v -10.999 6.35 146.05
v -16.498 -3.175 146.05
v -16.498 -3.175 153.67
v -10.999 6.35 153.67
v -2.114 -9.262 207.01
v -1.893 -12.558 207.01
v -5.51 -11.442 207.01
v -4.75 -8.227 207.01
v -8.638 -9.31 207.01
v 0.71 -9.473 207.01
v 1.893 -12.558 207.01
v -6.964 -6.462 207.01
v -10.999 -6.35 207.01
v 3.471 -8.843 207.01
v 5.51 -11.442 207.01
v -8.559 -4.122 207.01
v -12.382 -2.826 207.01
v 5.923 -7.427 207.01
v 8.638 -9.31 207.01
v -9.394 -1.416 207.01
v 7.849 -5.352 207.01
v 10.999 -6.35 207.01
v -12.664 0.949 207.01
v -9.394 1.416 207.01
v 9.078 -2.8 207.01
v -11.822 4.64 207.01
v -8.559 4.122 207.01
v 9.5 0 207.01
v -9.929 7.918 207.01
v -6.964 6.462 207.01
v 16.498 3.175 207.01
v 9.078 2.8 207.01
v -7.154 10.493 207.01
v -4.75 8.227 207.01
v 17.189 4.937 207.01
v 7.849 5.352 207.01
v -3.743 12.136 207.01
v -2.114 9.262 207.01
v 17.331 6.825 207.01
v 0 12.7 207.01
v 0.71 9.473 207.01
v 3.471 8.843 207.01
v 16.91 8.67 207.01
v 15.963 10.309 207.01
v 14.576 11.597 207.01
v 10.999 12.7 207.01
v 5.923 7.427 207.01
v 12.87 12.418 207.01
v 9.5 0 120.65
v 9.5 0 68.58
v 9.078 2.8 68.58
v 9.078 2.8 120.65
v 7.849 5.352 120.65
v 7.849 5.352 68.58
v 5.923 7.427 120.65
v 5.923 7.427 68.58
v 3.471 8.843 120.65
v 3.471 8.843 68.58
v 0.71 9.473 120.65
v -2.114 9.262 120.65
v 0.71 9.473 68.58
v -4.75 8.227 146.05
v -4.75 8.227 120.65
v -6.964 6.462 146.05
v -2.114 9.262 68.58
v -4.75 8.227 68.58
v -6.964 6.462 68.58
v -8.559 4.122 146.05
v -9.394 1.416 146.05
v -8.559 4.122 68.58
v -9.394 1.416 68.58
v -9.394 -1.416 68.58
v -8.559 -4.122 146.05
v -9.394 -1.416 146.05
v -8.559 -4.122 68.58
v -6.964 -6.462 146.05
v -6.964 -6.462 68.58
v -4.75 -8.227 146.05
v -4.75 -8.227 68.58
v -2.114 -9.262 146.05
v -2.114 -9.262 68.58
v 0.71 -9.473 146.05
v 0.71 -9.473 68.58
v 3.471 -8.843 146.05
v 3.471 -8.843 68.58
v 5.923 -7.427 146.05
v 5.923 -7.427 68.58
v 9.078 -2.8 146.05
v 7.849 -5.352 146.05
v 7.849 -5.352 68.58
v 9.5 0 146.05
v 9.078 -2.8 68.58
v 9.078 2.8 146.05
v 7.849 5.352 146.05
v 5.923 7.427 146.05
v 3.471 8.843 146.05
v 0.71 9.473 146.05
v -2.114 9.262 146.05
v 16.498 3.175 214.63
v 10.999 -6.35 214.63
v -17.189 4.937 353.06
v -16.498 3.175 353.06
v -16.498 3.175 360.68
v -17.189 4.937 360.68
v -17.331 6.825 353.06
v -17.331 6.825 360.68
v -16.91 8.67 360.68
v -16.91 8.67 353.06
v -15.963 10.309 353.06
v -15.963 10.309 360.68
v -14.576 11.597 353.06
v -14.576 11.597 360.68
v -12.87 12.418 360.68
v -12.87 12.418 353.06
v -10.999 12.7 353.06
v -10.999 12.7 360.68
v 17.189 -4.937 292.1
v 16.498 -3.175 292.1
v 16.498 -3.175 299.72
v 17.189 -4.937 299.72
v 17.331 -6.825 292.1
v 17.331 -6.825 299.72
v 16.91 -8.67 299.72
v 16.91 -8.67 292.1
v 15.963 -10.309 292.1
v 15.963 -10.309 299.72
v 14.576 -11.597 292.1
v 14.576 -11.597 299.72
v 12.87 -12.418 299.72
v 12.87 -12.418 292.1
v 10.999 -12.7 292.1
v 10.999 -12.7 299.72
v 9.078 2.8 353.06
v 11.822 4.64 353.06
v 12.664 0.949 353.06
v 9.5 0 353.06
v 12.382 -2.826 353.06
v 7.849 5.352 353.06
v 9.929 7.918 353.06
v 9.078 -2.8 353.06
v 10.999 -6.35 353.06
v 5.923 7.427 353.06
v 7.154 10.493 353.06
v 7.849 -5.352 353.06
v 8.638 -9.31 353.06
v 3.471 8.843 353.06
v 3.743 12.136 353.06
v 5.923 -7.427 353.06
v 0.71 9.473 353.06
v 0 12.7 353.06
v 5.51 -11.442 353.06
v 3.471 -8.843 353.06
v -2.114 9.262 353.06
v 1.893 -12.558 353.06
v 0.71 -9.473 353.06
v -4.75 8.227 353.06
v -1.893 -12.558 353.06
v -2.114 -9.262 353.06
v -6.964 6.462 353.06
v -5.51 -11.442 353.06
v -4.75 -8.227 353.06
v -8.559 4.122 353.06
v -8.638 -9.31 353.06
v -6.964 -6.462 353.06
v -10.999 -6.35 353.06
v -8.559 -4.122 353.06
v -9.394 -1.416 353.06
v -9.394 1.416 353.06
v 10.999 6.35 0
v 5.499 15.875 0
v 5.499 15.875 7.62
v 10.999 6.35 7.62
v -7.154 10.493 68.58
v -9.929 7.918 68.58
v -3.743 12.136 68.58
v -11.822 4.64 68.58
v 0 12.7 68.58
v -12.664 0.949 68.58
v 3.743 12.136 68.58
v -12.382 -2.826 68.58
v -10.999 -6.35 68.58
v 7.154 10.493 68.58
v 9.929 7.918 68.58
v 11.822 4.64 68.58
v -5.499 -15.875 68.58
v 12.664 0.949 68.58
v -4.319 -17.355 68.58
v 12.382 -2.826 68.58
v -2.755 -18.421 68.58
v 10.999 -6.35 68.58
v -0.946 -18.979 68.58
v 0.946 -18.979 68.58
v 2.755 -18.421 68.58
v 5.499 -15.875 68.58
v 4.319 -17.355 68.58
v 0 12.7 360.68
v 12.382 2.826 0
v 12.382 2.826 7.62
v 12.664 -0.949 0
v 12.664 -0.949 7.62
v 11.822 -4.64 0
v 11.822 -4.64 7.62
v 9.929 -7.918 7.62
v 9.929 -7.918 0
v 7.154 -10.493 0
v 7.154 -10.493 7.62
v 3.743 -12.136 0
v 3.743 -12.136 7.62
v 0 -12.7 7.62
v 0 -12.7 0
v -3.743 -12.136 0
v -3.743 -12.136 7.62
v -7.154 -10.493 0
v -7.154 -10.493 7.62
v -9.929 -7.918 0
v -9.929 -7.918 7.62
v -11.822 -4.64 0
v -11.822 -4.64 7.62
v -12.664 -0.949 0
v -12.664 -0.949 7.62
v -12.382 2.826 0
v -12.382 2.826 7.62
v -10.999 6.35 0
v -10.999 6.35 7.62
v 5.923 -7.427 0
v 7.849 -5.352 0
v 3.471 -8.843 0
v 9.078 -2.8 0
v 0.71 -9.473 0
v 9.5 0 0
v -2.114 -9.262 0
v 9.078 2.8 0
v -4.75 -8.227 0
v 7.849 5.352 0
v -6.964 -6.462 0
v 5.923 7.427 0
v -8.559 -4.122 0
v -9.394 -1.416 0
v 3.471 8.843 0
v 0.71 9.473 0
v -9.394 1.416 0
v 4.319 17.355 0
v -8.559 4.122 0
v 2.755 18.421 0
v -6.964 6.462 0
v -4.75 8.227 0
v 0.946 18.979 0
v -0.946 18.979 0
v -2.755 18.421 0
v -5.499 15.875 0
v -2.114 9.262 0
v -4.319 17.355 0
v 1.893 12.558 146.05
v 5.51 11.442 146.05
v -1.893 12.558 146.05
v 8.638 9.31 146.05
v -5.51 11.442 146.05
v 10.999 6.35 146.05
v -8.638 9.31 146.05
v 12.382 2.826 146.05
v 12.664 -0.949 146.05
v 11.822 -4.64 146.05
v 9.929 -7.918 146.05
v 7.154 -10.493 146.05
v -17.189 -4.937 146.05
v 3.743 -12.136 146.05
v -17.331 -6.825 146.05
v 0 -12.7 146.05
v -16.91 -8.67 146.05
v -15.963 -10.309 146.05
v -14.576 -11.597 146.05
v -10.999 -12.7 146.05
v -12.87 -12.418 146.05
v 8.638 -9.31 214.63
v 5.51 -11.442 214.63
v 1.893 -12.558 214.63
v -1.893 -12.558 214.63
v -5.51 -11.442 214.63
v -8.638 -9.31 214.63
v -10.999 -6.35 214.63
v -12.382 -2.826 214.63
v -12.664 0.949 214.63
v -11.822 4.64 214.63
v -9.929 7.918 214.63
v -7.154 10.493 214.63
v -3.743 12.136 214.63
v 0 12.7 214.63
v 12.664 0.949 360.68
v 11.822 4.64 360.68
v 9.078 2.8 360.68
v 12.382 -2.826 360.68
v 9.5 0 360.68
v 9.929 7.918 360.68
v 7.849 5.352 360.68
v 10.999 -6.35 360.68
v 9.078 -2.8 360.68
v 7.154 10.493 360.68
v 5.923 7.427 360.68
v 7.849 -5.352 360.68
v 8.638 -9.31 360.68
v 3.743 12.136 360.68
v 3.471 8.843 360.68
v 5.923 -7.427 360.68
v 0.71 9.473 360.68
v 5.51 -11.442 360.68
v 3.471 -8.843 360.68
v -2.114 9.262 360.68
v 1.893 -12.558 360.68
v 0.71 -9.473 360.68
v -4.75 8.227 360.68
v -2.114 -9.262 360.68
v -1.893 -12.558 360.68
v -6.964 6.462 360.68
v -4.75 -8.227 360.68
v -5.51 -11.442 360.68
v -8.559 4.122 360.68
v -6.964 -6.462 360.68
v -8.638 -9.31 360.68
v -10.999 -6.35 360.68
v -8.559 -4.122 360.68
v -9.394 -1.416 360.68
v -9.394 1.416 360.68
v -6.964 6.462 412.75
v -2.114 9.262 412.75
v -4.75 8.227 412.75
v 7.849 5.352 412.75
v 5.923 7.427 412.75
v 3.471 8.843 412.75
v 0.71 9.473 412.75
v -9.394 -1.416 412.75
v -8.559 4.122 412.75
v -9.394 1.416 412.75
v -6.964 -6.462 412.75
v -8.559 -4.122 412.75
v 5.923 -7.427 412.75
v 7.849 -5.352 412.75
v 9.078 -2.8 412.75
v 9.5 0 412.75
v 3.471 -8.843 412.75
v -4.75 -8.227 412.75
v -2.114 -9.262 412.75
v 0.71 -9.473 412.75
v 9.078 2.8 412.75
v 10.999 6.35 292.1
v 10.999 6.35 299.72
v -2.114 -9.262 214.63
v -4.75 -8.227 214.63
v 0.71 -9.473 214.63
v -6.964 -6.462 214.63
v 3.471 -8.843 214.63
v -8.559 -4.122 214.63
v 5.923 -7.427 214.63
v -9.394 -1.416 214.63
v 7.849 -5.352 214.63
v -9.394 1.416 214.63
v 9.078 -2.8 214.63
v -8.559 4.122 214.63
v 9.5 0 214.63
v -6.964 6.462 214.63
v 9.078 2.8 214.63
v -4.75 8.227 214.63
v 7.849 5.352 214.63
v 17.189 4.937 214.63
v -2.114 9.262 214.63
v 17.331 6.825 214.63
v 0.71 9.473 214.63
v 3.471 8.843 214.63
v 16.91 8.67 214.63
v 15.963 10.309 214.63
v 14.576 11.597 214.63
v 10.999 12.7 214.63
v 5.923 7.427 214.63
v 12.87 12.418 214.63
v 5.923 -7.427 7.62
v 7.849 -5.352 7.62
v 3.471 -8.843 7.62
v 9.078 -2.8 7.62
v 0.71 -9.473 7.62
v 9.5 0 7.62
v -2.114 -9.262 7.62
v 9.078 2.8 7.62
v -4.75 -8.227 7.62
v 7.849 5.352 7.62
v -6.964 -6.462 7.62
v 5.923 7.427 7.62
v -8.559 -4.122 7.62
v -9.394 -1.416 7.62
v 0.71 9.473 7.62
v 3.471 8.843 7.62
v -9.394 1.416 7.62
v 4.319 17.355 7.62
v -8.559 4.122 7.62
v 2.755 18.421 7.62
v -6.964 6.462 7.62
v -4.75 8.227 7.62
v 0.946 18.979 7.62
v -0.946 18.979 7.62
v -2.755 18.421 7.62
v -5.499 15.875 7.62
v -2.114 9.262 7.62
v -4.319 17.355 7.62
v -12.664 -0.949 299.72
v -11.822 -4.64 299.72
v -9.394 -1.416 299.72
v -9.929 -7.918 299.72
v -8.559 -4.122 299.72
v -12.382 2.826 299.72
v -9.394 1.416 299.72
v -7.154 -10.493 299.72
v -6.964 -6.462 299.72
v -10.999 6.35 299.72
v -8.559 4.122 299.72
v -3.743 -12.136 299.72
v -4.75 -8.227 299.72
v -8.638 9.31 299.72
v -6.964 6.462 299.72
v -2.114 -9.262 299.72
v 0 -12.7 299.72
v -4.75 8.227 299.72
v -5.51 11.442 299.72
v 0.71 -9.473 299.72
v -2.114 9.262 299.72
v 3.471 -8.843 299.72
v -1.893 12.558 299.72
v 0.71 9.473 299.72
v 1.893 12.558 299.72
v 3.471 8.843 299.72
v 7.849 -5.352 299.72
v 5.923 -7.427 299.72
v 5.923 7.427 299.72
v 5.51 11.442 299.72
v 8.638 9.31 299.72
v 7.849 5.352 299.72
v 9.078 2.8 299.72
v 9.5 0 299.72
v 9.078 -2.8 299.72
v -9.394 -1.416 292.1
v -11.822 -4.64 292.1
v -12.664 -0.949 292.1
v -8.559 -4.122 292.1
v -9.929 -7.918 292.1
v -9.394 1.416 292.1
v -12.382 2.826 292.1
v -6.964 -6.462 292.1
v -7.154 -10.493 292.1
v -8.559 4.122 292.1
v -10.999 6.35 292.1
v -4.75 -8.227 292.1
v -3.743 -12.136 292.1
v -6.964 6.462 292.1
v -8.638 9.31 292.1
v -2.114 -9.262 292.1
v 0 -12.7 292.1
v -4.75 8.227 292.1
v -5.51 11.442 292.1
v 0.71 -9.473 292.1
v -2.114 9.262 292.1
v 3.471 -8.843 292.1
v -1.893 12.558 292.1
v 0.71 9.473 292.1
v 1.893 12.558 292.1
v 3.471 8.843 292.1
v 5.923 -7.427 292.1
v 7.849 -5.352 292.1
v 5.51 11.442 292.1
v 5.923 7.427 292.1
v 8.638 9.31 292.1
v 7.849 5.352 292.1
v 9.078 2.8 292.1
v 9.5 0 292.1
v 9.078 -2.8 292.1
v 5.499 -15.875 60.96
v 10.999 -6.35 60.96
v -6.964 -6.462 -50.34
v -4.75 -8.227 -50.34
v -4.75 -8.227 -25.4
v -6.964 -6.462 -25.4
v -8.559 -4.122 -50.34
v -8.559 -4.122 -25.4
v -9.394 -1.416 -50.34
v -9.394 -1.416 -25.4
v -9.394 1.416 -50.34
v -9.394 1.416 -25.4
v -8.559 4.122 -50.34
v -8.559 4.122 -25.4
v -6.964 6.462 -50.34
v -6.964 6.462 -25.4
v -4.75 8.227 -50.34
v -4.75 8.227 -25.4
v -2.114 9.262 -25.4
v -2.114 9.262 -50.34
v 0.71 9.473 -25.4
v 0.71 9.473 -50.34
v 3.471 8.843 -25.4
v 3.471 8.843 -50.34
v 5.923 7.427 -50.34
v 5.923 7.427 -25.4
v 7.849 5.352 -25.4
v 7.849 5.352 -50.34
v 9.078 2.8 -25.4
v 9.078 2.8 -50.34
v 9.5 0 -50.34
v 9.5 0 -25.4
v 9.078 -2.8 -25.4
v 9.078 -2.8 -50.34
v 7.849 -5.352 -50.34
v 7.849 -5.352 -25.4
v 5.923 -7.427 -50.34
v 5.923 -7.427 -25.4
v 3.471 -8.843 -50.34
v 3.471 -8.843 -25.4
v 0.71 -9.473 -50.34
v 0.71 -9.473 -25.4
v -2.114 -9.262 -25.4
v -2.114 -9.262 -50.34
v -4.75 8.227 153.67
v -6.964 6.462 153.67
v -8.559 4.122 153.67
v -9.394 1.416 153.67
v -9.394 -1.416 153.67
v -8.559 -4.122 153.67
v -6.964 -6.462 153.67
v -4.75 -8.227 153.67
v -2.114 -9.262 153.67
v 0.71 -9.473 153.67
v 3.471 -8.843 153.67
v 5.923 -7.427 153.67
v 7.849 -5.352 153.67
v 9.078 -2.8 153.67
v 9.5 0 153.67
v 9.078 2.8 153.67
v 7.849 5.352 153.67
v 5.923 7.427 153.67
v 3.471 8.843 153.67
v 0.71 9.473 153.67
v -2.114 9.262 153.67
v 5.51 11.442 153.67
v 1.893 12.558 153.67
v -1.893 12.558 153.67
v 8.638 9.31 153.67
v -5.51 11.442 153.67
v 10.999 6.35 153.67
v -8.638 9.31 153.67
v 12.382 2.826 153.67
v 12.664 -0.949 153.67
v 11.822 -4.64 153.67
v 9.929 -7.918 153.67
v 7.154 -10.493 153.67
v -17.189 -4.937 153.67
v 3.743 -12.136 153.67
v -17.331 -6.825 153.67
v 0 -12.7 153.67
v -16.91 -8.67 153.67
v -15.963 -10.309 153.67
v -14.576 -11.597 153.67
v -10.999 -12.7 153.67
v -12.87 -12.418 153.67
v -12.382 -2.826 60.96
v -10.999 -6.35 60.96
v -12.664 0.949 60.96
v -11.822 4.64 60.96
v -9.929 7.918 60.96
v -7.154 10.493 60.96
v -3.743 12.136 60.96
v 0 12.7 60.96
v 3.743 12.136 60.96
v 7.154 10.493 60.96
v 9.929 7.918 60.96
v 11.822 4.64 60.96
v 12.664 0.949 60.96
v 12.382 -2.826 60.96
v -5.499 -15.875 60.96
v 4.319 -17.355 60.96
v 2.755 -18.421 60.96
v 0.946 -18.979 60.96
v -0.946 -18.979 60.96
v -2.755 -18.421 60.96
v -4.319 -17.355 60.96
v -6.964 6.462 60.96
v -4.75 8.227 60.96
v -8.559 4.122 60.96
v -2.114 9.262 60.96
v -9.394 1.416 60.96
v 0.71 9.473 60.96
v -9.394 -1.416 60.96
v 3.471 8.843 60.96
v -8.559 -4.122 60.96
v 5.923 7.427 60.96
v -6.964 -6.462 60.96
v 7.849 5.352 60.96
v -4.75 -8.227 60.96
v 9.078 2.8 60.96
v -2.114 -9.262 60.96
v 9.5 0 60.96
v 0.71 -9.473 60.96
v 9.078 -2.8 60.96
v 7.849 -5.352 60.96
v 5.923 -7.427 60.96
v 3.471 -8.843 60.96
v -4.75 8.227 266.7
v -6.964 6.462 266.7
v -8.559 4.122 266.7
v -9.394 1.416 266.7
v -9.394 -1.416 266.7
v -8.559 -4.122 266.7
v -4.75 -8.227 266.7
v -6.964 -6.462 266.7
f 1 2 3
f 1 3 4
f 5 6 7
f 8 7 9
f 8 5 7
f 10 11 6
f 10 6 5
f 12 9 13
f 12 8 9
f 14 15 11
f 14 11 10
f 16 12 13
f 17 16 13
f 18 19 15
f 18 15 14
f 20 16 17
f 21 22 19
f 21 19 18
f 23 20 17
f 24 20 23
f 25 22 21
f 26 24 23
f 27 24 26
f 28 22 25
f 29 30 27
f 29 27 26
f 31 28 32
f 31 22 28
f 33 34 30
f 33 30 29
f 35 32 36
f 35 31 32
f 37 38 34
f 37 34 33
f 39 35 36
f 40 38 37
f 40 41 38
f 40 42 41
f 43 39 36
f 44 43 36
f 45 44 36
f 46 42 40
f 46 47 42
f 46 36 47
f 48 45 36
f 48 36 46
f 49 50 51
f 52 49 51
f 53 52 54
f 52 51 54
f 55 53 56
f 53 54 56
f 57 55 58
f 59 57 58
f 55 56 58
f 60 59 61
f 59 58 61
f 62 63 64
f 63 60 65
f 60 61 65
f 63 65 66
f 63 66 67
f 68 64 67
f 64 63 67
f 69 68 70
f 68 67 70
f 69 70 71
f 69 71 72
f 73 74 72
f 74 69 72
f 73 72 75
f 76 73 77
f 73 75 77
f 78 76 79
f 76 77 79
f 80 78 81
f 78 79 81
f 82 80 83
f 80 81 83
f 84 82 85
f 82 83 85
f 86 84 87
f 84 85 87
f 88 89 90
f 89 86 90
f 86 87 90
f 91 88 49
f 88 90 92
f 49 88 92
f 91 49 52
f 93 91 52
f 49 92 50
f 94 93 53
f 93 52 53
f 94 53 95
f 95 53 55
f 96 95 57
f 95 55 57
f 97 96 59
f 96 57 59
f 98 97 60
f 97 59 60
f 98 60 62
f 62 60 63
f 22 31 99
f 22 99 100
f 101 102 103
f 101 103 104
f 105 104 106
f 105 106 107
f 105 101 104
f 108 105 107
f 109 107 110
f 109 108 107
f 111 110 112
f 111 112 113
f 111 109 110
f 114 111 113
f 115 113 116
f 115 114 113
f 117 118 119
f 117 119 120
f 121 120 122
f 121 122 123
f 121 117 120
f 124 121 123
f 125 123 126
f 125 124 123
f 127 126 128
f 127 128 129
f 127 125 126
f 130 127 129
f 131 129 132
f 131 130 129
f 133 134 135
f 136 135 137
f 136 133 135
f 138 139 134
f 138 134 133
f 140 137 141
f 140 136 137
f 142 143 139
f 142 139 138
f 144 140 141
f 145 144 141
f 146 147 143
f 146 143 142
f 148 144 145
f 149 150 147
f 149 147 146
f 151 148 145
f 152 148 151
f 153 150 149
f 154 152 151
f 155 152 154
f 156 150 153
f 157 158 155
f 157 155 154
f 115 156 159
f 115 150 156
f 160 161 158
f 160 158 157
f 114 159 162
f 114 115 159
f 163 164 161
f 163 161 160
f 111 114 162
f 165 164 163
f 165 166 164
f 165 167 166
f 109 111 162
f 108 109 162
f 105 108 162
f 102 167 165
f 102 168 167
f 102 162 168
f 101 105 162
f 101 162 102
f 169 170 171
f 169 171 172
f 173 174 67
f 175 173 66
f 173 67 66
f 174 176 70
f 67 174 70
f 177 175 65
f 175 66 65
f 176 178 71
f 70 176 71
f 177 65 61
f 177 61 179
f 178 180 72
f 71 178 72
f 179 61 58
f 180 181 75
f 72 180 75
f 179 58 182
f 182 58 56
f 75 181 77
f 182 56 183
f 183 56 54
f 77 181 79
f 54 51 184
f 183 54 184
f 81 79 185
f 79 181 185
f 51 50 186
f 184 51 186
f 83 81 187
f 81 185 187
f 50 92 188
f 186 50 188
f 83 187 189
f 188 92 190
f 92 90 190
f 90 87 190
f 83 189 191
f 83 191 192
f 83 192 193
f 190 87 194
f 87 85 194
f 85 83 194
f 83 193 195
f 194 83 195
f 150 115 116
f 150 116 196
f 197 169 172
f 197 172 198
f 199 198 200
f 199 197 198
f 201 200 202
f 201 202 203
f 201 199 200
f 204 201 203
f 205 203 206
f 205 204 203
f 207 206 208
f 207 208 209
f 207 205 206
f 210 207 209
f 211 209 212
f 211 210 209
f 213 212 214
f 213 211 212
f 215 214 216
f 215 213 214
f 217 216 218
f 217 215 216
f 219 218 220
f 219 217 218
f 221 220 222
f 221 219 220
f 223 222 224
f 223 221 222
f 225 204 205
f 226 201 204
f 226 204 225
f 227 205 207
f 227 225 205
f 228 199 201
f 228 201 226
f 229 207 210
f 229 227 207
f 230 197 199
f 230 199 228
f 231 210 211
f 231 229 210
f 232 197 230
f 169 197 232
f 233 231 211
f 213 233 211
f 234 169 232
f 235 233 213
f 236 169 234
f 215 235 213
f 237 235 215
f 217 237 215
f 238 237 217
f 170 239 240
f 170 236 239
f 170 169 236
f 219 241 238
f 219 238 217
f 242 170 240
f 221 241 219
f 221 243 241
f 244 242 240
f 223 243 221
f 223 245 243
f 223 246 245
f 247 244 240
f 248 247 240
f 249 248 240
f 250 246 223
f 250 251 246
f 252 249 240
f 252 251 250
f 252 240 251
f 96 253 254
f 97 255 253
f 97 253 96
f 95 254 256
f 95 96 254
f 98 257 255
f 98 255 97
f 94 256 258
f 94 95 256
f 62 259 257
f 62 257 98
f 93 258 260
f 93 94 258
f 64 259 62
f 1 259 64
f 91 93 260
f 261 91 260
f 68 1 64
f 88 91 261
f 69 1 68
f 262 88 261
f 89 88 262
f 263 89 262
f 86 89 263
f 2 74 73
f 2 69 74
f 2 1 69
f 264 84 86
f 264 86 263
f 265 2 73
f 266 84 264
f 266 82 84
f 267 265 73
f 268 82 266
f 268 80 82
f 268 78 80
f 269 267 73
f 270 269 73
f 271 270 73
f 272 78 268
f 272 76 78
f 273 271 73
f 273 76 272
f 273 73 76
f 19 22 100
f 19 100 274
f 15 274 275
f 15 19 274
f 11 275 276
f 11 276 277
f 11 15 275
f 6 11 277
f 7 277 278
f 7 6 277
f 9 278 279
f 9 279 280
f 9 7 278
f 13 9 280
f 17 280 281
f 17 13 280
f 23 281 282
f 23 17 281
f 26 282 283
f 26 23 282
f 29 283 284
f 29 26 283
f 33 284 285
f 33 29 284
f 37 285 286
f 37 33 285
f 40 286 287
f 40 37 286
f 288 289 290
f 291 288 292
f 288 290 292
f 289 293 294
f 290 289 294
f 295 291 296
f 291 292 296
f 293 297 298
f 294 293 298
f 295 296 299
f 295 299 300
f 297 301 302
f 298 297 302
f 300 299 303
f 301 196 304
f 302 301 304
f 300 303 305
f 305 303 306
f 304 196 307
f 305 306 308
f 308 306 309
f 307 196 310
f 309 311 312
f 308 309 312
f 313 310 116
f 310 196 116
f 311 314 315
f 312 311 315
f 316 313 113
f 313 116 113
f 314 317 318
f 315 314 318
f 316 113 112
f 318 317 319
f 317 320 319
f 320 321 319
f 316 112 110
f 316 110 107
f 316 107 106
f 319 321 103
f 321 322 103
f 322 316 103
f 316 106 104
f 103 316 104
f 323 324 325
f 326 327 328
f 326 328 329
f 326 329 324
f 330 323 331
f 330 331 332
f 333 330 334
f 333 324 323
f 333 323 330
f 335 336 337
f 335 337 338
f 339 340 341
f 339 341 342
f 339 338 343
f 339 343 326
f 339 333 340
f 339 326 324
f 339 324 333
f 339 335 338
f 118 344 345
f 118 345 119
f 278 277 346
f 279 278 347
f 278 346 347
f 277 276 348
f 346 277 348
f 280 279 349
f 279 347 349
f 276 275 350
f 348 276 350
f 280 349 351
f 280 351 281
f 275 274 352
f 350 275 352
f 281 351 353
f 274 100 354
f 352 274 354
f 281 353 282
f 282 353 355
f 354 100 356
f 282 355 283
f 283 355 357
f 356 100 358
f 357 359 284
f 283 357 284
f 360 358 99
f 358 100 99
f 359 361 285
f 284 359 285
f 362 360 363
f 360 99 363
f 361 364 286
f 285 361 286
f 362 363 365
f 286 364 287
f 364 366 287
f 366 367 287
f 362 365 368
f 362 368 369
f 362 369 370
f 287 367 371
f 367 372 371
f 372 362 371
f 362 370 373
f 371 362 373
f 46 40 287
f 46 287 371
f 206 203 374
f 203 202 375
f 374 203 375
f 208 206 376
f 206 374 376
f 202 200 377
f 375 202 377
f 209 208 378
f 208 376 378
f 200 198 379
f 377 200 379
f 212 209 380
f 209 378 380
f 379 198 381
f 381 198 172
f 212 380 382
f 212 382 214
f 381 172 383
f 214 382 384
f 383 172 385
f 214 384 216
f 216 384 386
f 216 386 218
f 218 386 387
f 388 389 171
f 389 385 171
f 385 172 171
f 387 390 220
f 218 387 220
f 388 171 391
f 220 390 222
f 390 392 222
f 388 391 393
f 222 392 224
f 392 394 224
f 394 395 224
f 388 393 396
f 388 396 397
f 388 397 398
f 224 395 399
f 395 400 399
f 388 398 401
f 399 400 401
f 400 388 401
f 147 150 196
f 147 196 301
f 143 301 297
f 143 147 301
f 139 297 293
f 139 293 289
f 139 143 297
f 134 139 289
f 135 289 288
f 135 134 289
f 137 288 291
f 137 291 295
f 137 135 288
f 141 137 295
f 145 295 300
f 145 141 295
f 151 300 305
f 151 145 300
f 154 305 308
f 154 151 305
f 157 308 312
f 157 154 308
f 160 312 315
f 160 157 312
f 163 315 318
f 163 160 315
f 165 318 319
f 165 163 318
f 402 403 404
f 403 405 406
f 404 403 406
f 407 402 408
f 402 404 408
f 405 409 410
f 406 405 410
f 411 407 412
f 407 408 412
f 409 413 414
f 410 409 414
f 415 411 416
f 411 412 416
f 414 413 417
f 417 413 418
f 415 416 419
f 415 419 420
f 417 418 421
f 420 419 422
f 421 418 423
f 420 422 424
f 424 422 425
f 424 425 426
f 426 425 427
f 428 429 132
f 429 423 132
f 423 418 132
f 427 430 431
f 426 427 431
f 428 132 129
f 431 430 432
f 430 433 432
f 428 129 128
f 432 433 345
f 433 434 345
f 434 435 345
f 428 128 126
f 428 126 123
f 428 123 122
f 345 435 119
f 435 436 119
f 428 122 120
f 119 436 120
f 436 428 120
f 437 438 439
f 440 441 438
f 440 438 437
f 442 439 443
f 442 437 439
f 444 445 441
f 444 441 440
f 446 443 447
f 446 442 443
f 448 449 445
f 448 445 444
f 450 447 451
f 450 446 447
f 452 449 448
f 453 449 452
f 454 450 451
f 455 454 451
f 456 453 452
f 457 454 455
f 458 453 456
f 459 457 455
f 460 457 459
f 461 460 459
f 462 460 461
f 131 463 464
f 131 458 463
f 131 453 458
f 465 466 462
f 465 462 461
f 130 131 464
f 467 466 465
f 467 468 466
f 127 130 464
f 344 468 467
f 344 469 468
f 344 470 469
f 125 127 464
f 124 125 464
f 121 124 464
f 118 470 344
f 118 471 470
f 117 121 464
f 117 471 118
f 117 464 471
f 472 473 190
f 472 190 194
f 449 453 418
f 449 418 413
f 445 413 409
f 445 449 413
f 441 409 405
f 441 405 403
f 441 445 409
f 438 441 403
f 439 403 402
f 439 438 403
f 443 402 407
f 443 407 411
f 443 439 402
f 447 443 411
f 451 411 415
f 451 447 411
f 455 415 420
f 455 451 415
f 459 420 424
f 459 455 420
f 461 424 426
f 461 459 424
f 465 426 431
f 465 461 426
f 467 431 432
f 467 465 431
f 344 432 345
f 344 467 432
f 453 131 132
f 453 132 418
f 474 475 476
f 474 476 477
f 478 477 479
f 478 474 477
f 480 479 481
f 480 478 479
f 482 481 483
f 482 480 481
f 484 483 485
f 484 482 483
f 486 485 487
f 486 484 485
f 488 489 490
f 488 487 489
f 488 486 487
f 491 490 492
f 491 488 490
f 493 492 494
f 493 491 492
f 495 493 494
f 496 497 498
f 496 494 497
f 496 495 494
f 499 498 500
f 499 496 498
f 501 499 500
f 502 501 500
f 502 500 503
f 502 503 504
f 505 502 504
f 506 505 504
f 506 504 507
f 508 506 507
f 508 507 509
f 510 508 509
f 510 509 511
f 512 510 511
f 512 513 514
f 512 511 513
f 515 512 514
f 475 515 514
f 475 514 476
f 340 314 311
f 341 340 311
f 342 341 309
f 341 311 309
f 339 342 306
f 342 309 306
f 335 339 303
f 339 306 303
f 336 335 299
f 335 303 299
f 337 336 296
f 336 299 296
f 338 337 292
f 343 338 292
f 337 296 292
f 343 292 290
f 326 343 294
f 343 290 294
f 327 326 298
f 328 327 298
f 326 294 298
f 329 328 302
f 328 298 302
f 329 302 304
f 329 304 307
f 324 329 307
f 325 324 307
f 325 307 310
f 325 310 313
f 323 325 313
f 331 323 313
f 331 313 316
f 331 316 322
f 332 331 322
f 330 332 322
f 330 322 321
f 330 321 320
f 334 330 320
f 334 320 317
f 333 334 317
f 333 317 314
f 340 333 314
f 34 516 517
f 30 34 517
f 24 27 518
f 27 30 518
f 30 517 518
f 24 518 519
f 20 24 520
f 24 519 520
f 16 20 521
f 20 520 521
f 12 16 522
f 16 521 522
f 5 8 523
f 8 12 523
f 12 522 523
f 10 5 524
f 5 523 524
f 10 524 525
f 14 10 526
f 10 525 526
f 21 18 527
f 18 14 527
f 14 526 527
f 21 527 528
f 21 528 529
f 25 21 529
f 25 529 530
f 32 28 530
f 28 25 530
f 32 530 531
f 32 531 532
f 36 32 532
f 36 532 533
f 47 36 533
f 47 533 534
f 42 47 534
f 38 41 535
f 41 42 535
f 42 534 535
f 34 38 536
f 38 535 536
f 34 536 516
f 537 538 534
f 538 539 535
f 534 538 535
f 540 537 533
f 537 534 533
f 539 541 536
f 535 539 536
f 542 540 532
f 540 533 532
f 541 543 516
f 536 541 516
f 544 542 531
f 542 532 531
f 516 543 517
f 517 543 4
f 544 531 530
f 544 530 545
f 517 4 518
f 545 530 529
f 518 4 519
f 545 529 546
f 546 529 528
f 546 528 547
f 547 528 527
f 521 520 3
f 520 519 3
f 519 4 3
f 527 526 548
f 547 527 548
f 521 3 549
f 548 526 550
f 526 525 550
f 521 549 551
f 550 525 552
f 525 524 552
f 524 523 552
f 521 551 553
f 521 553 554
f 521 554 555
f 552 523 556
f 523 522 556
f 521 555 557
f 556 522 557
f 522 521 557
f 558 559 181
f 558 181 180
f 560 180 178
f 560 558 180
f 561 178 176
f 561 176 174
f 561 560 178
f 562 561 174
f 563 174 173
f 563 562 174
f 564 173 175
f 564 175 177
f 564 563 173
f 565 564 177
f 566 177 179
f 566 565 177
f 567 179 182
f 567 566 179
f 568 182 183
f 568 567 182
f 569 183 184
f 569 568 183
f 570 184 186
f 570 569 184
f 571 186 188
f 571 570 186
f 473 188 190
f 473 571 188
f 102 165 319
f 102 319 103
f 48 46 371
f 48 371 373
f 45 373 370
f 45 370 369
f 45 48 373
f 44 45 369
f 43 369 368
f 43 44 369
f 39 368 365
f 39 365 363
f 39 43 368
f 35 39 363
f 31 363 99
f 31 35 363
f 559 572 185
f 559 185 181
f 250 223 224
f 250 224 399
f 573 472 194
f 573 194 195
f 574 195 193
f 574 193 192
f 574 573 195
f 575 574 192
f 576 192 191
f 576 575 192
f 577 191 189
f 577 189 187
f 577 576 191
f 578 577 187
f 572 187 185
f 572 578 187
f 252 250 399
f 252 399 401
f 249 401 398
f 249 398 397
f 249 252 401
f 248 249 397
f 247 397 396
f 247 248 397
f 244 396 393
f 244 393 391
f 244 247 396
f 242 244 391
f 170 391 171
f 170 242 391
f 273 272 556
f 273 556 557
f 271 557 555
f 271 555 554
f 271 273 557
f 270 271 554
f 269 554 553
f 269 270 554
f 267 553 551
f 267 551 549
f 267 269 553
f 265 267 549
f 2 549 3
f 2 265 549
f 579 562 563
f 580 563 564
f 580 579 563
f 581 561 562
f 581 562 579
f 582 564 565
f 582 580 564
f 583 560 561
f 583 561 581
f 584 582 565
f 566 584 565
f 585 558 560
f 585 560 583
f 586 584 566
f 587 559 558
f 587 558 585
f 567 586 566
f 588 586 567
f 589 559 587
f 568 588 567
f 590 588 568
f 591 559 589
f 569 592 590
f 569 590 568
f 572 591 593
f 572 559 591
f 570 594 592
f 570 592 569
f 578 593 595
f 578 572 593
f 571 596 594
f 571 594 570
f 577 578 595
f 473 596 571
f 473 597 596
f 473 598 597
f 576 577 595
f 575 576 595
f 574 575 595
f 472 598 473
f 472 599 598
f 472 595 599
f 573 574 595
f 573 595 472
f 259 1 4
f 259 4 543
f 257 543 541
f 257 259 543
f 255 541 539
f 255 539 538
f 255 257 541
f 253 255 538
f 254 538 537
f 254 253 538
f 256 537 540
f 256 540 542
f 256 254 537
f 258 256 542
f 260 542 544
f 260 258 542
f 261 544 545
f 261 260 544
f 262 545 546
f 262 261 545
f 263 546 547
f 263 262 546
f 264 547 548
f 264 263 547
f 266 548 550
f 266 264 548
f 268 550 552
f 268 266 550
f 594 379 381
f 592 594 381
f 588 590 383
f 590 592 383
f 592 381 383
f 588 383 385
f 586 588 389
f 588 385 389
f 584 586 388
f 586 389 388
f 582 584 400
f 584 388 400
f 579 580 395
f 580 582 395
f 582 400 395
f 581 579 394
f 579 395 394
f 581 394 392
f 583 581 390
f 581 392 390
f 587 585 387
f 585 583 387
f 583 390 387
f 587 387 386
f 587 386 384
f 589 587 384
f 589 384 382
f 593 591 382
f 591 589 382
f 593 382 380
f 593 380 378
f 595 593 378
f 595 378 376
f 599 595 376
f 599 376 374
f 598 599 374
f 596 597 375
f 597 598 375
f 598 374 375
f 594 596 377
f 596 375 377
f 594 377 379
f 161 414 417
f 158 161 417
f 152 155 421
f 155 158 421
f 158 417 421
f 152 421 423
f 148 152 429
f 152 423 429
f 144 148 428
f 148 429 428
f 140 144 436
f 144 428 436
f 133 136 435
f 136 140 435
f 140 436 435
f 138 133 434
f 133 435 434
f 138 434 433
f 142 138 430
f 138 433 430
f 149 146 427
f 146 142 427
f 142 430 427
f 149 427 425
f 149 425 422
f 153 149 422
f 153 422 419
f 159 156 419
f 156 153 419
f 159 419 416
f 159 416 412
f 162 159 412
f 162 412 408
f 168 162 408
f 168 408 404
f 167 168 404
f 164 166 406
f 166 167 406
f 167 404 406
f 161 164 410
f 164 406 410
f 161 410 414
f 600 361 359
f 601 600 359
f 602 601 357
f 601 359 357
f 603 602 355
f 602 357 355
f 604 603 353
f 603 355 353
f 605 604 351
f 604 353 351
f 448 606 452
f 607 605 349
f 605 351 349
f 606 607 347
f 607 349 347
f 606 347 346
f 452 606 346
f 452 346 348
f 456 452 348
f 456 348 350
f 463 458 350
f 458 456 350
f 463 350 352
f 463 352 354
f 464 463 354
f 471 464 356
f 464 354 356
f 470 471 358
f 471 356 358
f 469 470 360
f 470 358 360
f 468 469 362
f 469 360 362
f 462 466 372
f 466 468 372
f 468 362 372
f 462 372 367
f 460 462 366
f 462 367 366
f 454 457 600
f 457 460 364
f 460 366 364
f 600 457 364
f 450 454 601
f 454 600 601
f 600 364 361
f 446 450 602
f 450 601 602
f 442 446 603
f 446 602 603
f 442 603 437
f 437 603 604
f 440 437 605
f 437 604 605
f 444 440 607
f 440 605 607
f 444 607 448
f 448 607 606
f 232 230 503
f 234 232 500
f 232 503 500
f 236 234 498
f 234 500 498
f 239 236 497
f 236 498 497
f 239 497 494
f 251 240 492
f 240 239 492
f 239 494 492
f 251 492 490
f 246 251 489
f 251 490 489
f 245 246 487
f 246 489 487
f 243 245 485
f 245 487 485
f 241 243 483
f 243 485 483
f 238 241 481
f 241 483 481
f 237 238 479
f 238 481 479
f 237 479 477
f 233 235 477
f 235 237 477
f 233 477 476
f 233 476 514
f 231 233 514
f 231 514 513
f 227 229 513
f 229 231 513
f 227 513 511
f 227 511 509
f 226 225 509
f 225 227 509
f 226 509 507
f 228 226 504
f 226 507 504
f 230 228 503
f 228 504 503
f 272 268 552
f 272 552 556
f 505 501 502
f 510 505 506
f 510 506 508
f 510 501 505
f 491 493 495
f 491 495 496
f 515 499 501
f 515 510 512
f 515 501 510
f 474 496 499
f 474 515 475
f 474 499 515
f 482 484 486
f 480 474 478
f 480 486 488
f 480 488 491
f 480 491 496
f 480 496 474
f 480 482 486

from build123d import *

# Parameters (mm, degrees)
BOSS_EXTRUDE1_DEPTH   = 7.62
BODY_MOVE_COPY5_ANGLE = 180
BOSS_EXTRUDE2_START   = -25.4
SKETCH4_R             = 9.5
BOSS_EXTRUDE2_DEPTH   = 146.05
LPATTERN2_COUNT       = 3
LPATTERN2_PITCH       = 146.05
BODY_MOVE_COPY6_ANGLE = 120
BODY_MOVE_COPY7_ANGLE = 120
BOSS_EXTRUDE3_START   = 24.94
SKETCH6_R             = 9.5
BOSS_EXTRUDE3_DEPTH   = 24.94


with BuildPart() as part:
    # Sketch2 → Boss-Extrude1 (new body)
    with BuildSketch(Plane.XY):
        with BuildLine():
            Line((-10.998522628, 6.35), (-5.499261314, 15.875))
            ThreePointArc((-5.499261314, 15.875), (0, 19.05), (5.499261314, 15.875))
            Line((5.499261314, 15.875), (10.998522628, 6.35))
            ThreePointArc((10.998522628, 6.35), (0, -12.7), (-10.998522628, 6.35))
        make_face()
    extrude(amount=BOSS_EXTRUDE1_DEPTH)


with BuildPart() as body_2:
    # Body-Move/Copy4: copy of part
    add(part.part.moved(Location((0, 0, 60.96))))


with BuildPart() as body_2_1:
    # Body-Move/Copy5: moved
    add(body_2.part.rotate(Axis((0, 0, 0), (0, 0, 1)), BODY_MOVE_COPY5_ANGLE))


with BuildPart() as part_1:
    add(part.part)

    add(body_2_1.part)  # Boss-Extrude2 merges body 2
    # Sketch4 → Boss-Extrude2 (add)
    with BuildSketch(Plane.XY.offset(BOSS_EXTRUDE2_START)):
        Circle(SKETCH4_R)
    extrude(amount=BOSS_EXTRUDE2_DEPTH)


with BuildPart() as lpattern2_1:
    # LPattern2: pattern copy
    add(part_1.part.moved(Location(Vector(0, 0, 1) * (1 * LPATTERN2_PITCH))))


with BuildPart() as lpattern2_2:
    # LPattern2: pattern copy
    add(part_1.part.moved(Location(Vector(0, 0, 1) * (2 * LPATTERN2_PITCH))))


with BuildPart() as lpattern2_1_1:
    # Body-Move/Copy6: moved
    add(lpattern2_1.part.rotate(Axis((0, 0, 0), (0, 0, 1)), BODY_MOVE_COPY6_ANGLE))


with BuildPart() as lpattern2_2_1:
    # Body-Move/Copy7: moved
    add(lpattern2_2.part.rotate(Axis((0, 0, 0), (0, 0, -1)), BODY_MOVE_COPY7_ANGLE))


with BuildPart() as part_2:
    add(part_1.part)

    # Sketch6 → Boss-Extrude3 (add)
    with BuildSketch(Plane(origin=(0, 0, -25.4), x_dir=(-1, 0, 0), z_dir=(0, 0, -1)).offset(BOSS_EXTRUDE3_START)):
        Circle(SKETCH6_R)
    extrude(amount=-BOSS_EXTRUDE3_DEPTH)

    # Combine1: union LPattern2_1, LPattern2_2
    add(lpattern2_1_1.part)
    add(lpattern2_2_1.part)


solid = part_2.part
